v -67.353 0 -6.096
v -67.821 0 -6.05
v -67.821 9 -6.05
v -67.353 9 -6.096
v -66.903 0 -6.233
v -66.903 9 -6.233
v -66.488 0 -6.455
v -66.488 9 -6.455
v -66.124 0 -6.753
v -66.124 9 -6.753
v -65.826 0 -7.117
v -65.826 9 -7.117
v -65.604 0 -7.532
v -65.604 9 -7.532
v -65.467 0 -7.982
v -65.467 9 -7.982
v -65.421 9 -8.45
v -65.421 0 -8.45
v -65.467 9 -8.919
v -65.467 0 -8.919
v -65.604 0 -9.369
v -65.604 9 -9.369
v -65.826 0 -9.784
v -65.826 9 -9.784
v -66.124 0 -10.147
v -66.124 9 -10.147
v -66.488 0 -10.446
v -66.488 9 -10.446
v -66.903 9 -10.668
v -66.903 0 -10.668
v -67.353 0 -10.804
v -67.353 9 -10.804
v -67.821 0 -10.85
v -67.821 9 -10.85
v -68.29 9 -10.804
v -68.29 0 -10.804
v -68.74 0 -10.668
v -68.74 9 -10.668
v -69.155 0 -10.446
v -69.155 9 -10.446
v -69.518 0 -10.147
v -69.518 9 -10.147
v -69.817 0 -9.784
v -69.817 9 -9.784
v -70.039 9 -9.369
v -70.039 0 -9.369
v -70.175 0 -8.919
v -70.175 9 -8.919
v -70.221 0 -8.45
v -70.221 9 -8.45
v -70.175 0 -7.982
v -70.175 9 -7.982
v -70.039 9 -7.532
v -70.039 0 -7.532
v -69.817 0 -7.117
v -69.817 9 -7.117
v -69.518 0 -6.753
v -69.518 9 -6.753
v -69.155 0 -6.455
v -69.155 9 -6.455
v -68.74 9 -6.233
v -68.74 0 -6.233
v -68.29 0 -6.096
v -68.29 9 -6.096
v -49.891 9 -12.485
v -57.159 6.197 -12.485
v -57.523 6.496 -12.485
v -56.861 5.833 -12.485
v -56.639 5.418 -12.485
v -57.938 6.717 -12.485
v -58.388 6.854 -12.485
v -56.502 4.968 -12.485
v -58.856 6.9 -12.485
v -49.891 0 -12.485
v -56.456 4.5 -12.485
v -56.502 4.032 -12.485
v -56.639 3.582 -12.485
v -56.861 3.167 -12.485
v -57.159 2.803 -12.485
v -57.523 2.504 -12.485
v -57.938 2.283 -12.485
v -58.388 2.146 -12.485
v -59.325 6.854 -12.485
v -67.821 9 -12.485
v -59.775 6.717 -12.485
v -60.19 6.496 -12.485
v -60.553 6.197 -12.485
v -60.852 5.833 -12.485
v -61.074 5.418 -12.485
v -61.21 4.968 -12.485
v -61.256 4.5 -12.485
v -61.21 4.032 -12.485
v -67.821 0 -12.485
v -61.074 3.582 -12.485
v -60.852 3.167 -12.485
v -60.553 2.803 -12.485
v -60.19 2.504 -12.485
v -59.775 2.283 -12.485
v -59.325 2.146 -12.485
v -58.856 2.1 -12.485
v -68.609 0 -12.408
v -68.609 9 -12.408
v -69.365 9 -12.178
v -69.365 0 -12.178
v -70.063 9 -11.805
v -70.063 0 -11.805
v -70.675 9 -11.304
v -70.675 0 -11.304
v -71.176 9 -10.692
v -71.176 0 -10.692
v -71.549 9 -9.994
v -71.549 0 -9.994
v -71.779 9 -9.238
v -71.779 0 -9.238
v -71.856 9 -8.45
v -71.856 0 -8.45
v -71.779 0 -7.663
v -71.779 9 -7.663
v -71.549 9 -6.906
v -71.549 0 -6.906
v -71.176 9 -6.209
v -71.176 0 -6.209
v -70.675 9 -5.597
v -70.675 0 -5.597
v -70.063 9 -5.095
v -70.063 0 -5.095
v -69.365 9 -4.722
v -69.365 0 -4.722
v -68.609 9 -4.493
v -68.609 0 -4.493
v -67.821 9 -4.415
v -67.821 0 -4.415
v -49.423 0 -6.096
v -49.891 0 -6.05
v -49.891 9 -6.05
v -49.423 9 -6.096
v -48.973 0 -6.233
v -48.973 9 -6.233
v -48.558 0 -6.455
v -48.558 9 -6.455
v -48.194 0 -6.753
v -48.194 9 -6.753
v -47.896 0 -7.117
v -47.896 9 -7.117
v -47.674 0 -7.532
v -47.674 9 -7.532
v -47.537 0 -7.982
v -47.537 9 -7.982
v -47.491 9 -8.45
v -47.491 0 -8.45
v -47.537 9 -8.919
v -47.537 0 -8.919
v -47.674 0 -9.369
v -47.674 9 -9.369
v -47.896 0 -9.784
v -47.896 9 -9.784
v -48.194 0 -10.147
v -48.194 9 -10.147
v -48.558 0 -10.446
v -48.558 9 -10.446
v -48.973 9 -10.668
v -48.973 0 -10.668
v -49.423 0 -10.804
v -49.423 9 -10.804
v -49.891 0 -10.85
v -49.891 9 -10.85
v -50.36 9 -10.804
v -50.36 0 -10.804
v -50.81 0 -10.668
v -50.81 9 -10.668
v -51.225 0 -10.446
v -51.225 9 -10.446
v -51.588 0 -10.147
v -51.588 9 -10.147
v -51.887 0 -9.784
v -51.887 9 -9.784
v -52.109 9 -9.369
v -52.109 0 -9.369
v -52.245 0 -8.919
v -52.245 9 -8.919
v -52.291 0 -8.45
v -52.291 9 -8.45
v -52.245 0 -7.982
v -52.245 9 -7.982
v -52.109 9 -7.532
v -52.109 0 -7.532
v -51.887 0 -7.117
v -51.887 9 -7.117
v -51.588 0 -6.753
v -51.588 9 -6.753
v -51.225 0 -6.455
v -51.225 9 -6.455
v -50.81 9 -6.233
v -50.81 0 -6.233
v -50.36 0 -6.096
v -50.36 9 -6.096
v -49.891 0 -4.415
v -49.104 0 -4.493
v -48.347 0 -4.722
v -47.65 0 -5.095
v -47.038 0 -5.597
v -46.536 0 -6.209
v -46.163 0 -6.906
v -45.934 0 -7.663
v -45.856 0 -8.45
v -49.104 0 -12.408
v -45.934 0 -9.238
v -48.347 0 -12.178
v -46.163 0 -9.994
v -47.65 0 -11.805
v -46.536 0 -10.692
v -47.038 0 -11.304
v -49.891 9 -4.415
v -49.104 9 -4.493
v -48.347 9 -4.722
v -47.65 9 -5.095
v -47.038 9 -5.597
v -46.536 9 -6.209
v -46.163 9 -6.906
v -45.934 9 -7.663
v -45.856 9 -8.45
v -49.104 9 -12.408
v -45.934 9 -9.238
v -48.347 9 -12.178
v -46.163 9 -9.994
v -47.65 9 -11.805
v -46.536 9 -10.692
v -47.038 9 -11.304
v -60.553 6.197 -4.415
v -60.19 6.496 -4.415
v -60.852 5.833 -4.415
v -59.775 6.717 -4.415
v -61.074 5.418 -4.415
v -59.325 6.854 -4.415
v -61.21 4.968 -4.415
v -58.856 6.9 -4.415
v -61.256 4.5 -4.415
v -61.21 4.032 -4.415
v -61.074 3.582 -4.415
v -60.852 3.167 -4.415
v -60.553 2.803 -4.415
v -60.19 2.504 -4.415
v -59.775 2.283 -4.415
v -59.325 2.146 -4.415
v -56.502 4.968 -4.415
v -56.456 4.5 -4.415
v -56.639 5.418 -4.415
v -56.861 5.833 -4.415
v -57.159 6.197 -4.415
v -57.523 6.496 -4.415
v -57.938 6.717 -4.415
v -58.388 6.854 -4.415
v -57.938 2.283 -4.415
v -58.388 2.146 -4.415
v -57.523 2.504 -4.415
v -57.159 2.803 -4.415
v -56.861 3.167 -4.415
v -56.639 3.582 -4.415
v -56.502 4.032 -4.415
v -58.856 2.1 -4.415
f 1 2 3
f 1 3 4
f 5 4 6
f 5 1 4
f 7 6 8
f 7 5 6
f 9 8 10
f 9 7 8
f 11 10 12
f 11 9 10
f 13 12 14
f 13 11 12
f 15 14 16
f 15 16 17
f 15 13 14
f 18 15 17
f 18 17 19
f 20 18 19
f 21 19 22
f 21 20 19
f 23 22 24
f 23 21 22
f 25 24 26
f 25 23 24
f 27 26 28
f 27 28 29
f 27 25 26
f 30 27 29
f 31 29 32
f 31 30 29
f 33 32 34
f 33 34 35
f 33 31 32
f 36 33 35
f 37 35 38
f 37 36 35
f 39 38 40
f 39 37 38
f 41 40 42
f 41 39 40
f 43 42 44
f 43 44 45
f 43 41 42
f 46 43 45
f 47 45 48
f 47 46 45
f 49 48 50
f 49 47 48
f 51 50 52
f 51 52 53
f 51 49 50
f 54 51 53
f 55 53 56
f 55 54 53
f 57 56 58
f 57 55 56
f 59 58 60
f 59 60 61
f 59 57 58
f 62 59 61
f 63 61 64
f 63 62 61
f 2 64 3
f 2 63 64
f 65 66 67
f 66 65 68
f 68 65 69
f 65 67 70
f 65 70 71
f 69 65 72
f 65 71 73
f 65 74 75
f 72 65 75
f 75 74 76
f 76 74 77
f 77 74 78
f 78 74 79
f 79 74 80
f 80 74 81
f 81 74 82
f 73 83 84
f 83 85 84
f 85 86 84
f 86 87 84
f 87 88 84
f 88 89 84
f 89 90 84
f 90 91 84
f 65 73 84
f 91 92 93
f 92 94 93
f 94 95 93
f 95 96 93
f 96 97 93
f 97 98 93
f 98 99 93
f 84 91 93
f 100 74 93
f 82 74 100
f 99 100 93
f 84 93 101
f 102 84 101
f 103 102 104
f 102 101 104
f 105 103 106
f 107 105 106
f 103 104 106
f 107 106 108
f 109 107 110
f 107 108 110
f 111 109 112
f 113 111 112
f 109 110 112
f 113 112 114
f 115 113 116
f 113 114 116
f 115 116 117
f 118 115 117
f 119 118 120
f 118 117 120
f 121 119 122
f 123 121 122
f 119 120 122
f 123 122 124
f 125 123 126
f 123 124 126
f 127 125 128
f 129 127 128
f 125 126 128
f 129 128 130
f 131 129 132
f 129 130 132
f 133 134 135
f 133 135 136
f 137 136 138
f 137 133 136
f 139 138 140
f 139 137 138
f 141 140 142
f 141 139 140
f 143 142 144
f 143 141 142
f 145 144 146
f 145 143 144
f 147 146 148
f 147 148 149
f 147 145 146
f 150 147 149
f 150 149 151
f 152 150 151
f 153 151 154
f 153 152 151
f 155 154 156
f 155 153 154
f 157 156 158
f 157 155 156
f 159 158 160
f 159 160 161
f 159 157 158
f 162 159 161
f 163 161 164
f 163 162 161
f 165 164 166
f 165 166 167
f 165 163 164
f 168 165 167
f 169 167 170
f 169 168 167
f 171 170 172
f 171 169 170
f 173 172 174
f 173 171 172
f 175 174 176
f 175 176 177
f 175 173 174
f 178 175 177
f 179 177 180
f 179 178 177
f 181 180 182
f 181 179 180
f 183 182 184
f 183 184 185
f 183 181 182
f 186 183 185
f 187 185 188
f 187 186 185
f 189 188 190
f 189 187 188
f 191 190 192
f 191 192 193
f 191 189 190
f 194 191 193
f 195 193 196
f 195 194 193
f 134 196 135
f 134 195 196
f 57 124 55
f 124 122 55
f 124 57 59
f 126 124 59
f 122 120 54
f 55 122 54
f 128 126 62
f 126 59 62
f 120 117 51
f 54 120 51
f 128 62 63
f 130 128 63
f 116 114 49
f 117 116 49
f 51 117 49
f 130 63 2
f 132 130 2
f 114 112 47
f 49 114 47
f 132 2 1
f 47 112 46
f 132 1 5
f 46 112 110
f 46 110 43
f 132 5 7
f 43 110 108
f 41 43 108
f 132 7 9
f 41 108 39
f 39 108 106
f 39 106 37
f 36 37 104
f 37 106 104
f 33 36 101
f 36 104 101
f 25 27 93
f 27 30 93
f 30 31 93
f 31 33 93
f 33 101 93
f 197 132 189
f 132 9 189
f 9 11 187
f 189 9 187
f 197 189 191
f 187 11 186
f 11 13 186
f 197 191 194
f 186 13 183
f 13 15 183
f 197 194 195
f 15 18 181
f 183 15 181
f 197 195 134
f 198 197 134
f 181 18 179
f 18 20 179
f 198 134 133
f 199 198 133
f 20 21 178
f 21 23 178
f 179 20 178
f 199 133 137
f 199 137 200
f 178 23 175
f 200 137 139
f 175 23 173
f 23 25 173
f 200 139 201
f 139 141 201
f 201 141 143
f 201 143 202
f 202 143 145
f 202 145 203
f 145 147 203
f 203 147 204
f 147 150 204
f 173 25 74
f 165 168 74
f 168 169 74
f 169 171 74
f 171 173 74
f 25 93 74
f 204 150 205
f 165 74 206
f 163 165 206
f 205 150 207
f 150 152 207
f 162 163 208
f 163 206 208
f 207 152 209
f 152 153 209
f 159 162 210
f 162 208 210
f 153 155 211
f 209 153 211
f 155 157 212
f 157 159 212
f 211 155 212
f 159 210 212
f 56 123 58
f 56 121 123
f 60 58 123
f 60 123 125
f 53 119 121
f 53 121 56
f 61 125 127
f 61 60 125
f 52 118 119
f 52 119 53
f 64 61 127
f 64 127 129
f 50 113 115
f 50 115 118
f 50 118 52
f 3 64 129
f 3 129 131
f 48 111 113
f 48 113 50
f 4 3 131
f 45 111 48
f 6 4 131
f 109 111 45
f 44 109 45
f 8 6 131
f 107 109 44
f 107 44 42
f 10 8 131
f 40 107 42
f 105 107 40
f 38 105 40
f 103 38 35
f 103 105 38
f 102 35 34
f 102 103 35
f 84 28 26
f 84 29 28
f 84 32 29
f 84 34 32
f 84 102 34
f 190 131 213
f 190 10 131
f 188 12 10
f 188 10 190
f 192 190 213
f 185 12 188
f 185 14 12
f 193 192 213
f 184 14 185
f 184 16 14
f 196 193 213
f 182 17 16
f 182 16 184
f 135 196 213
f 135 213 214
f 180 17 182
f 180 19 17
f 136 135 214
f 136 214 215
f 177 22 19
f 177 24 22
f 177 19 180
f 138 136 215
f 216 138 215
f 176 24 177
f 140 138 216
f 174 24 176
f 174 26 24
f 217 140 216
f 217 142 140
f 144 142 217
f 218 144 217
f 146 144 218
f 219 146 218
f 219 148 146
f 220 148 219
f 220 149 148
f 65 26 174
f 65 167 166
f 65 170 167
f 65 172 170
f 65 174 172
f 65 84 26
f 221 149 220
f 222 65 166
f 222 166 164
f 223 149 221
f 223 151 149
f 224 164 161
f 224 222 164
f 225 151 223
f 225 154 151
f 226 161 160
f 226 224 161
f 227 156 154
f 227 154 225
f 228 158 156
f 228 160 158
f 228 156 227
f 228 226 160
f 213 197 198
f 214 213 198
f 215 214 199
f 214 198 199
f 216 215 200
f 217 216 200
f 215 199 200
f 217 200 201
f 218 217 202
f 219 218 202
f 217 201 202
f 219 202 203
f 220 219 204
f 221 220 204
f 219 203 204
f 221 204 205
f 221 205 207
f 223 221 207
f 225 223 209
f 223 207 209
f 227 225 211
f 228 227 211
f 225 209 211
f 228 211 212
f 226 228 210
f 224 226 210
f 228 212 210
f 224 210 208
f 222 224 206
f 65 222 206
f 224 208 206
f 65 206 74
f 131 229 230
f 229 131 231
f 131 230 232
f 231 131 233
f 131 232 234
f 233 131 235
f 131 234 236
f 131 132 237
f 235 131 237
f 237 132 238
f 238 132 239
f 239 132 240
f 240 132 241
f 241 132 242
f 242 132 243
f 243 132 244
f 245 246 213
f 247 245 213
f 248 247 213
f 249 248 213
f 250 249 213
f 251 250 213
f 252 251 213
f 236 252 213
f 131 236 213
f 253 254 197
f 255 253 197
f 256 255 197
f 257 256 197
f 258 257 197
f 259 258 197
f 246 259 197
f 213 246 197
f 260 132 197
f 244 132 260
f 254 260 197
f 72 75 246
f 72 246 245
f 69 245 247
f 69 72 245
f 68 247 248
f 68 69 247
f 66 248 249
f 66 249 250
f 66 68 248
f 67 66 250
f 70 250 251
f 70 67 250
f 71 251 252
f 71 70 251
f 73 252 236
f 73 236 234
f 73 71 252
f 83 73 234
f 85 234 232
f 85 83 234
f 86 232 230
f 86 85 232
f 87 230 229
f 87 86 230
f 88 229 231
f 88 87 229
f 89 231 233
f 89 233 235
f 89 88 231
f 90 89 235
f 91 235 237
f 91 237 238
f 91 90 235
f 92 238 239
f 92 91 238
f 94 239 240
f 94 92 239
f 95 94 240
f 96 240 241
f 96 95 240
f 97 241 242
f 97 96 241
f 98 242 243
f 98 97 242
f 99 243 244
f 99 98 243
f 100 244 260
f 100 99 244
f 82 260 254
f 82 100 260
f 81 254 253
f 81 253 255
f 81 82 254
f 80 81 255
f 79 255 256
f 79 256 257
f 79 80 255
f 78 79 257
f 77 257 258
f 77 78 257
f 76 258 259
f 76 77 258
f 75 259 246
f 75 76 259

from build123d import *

# Parameters (mm, degrees)
SKETCH1_R              = 2.4
BOSS_EXTRUDE2_DEPTH    = 9
CUT_EXTRUDE2_START     = -12.485338913
CUT_EXTRUDE2_OUTLINE_R = 2.4
CUT_EXTRUDE2_DEPTH     = 8.07


# Read off the part's stored shape, not the designer's step: Cut-Extrude2
with BuildPart() as part:
    # Sketch1 → Boss-Extrude2 (new body)
    with BuildSketch(Plane(origin=(0, 0, 0), x_dir=(1, 0, 0), z_dir=(0, 1, 0))):
        with BuildLine():
            Line((-49.891335879, 12.485338913), (-67.821335879, 12.485338913))
            ThreePointArc((-67.821335879, 12.485338913), (-70.674511741, 11.303514775), (-71.856335879, 8.450338913))
            ThreePointArc((-71.856335879, 8.450338913), (-70.674511741, 5.597163051), (-67.821335879, 4.415338913))
            Line((-67.821335879, 4.415338913), (-49.891335879, 4.415338913))
            ThreePointArc((-49.891335879, 4.415338913), (-47.038160017, 5.597163051), (-45.856335879, 8.450338913))
            ThreePointArc((-45.856335879, 8.450338913), (-47.038160017, 11.303514775), (-49.891335879, 12.485338913))
        make_face()
        with Locations(Location((-67.821335879, 8.450338913, 0), (0, 0, 270))):
            Circle(SKETCH1_R, mode=Mode.SUBTRACT)
        with Locations(Location((-49.891335879, 8.450338913, 0), (0, 0, 270))):
            Circle(SKETCH1_R, mode=Mode.SUBTRACT)
    extrude(amount=BOSS_EXTRUDE2_DEPTH)

    # Cut-Extrude2 outline → Cut-Extrude2 (cut)
    with BuildSketch(Plane.XY.offset(CUT_EXTRUDE2_START)):
        with Locations((-58.856335879, 4.5)):
            Circle(CUT_EXTRUDE2_OUTLINE_R)
    extrude(amount=CUT_EXTRUDE2_DEPTH, mode=Mode.SUBTRACT)


solid = part.part
